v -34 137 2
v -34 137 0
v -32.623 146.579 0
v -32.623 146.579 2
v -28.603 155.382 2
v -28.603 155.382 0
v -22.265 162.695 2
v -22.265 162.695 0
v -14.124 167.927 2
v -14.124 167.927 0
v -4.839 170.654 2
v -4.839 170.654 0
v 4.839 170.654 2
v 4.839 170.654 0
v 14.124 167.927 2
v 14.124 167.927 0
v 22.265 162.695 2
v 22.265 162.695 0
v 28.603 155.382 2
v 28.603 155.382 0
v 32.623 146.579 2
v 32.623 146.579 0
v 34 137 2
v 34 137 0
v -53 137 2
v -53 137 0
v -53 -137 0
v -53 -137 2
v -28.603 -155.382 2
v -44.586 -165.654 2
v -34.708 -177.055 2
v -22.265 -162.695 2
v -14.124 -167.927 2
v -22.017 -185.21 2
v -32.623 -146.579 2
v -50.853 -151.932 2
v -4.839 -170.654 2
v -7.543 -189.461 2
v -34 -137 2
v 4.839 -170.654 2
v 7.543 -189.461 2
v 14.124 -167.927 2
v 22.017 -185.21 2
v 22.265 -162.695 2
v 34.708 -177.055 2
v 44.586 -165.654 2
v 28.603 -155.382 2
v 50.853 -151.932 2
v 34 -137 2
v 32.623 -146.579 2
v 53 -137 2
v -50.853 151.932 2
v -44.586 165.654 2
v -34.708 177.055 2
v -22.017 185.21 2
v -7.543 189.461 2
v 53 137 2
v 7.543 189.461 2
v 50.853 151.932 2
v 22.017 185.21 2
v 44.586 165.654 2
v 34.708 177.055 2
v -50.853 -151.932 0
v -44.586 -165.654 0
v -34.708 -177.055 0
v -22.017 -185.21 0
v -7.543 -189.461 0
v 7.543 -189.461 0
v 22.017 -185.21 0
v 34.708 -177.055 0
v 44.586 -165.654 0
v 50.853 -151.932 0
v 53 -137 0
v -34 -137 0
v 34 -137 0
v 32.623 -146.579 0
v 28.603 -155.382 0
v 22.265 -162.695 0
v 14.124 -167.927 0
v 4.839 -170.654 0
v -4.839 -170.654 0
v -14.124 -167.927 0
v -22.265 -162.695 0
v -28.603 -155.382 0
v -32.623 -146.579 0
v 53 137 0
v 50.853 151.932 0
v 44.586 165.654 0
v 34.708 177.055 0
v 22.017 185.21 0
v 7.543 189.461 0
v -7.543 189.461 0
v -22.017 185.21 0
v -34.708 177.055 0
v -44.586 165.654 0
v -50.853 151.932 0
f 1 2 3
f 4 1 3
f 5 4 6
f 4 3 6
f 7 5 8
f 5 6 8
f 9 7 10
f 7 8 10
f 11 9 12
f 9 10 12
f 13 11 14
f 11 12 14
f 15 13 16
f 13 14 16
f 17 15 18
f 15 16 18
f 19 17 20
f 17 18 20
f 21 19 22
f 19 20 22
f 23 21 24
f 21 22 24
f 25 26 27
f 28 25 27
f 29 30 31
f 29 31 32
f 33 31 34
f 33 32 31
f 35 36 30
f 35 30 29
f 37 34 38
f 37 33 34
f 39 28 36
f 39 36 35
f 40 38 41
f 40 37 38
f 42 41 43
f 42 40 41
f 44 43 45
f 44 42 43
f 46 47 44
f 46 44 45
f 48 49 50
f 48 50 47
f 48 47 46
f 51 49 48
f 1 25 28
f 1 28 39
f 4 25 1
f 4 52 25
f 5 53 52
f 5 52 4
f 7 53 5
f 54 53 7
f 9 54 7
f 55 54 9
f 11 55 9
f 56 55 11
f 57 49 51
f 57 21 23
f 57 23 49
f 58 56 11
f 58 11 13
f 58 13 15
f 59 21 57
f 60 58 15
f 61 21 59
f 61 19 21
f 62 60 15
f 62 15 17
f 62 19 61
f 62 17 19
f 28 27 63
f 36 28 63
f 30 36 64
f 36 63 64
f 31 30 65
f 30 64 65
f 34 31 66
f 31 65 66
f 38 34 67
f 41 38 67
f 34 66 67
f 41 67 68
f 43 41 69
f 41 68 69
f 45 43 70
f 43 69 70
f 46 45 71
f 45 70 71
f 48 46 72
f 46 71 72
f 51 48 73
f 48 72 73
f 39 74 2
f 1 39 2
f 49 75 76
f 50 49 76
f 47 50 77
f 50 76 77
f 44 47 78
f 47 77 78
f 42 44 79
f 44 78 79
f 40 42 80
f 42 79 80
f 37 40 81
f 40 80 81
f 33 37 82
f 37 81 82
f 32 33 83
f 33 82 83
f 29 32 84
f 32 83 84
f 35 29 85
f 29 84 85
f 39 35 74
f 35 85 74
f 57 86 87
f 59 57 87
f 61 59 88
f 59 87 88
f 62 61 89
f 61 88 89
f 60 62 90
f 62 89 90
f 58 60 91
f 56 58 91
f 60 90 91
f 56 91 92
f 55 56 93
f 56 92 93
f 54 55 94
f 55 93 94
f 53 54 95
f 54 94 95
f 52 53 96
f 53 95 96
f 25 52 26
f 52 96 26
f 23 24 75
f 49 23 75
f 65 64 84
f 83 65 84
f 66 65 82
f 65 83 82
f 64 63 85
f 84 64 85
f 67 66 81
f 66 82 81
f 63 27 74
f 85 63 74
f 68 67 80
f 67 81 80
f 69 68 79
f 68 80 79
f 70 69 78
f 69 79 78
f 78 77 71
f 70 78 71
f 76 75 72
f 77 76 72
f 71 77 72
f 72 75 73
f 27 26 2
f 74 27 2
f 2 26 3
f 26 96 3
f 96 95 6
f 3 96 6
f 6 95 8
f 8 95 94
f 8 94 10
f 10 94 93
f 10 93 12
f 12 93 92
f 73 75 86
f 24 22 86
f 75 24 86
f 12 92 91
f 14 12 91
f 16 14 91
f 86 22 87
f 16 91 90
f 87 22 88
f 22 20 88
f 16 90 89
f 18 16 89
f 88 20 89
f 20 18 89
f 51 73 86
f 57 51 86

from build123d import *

# Parameters (mm, degrees)
F1_DEPTH = 2


with BuildPart() as f1:
    # F0 (on Top) → F1 (new body)
    with BuildSketch(Plane.XY):
        with BuildLine():
            ThreePointArc((53, 137), (0, 190), (-53, 137))
            Line((-53, 137), (-53, -137))
            ThreePointArc((-53, -137), (0, -190), (53, -137))
            Line((53, -137), (53, 137))
        make_face()
        with BuildLine():
            Line((-34, -137), (-34, 137))
            ThreePointArc((-34, 137), (0, 171), (34, 137))
            Line((34, 137), (34, -137))
            ThreePointArc((34, -137), (0, -171), (-34, -137))
        make_face(mode=Mode.SUBTRACT)
    extrude(amount=F1_DEPTH)


solid = f1.part
